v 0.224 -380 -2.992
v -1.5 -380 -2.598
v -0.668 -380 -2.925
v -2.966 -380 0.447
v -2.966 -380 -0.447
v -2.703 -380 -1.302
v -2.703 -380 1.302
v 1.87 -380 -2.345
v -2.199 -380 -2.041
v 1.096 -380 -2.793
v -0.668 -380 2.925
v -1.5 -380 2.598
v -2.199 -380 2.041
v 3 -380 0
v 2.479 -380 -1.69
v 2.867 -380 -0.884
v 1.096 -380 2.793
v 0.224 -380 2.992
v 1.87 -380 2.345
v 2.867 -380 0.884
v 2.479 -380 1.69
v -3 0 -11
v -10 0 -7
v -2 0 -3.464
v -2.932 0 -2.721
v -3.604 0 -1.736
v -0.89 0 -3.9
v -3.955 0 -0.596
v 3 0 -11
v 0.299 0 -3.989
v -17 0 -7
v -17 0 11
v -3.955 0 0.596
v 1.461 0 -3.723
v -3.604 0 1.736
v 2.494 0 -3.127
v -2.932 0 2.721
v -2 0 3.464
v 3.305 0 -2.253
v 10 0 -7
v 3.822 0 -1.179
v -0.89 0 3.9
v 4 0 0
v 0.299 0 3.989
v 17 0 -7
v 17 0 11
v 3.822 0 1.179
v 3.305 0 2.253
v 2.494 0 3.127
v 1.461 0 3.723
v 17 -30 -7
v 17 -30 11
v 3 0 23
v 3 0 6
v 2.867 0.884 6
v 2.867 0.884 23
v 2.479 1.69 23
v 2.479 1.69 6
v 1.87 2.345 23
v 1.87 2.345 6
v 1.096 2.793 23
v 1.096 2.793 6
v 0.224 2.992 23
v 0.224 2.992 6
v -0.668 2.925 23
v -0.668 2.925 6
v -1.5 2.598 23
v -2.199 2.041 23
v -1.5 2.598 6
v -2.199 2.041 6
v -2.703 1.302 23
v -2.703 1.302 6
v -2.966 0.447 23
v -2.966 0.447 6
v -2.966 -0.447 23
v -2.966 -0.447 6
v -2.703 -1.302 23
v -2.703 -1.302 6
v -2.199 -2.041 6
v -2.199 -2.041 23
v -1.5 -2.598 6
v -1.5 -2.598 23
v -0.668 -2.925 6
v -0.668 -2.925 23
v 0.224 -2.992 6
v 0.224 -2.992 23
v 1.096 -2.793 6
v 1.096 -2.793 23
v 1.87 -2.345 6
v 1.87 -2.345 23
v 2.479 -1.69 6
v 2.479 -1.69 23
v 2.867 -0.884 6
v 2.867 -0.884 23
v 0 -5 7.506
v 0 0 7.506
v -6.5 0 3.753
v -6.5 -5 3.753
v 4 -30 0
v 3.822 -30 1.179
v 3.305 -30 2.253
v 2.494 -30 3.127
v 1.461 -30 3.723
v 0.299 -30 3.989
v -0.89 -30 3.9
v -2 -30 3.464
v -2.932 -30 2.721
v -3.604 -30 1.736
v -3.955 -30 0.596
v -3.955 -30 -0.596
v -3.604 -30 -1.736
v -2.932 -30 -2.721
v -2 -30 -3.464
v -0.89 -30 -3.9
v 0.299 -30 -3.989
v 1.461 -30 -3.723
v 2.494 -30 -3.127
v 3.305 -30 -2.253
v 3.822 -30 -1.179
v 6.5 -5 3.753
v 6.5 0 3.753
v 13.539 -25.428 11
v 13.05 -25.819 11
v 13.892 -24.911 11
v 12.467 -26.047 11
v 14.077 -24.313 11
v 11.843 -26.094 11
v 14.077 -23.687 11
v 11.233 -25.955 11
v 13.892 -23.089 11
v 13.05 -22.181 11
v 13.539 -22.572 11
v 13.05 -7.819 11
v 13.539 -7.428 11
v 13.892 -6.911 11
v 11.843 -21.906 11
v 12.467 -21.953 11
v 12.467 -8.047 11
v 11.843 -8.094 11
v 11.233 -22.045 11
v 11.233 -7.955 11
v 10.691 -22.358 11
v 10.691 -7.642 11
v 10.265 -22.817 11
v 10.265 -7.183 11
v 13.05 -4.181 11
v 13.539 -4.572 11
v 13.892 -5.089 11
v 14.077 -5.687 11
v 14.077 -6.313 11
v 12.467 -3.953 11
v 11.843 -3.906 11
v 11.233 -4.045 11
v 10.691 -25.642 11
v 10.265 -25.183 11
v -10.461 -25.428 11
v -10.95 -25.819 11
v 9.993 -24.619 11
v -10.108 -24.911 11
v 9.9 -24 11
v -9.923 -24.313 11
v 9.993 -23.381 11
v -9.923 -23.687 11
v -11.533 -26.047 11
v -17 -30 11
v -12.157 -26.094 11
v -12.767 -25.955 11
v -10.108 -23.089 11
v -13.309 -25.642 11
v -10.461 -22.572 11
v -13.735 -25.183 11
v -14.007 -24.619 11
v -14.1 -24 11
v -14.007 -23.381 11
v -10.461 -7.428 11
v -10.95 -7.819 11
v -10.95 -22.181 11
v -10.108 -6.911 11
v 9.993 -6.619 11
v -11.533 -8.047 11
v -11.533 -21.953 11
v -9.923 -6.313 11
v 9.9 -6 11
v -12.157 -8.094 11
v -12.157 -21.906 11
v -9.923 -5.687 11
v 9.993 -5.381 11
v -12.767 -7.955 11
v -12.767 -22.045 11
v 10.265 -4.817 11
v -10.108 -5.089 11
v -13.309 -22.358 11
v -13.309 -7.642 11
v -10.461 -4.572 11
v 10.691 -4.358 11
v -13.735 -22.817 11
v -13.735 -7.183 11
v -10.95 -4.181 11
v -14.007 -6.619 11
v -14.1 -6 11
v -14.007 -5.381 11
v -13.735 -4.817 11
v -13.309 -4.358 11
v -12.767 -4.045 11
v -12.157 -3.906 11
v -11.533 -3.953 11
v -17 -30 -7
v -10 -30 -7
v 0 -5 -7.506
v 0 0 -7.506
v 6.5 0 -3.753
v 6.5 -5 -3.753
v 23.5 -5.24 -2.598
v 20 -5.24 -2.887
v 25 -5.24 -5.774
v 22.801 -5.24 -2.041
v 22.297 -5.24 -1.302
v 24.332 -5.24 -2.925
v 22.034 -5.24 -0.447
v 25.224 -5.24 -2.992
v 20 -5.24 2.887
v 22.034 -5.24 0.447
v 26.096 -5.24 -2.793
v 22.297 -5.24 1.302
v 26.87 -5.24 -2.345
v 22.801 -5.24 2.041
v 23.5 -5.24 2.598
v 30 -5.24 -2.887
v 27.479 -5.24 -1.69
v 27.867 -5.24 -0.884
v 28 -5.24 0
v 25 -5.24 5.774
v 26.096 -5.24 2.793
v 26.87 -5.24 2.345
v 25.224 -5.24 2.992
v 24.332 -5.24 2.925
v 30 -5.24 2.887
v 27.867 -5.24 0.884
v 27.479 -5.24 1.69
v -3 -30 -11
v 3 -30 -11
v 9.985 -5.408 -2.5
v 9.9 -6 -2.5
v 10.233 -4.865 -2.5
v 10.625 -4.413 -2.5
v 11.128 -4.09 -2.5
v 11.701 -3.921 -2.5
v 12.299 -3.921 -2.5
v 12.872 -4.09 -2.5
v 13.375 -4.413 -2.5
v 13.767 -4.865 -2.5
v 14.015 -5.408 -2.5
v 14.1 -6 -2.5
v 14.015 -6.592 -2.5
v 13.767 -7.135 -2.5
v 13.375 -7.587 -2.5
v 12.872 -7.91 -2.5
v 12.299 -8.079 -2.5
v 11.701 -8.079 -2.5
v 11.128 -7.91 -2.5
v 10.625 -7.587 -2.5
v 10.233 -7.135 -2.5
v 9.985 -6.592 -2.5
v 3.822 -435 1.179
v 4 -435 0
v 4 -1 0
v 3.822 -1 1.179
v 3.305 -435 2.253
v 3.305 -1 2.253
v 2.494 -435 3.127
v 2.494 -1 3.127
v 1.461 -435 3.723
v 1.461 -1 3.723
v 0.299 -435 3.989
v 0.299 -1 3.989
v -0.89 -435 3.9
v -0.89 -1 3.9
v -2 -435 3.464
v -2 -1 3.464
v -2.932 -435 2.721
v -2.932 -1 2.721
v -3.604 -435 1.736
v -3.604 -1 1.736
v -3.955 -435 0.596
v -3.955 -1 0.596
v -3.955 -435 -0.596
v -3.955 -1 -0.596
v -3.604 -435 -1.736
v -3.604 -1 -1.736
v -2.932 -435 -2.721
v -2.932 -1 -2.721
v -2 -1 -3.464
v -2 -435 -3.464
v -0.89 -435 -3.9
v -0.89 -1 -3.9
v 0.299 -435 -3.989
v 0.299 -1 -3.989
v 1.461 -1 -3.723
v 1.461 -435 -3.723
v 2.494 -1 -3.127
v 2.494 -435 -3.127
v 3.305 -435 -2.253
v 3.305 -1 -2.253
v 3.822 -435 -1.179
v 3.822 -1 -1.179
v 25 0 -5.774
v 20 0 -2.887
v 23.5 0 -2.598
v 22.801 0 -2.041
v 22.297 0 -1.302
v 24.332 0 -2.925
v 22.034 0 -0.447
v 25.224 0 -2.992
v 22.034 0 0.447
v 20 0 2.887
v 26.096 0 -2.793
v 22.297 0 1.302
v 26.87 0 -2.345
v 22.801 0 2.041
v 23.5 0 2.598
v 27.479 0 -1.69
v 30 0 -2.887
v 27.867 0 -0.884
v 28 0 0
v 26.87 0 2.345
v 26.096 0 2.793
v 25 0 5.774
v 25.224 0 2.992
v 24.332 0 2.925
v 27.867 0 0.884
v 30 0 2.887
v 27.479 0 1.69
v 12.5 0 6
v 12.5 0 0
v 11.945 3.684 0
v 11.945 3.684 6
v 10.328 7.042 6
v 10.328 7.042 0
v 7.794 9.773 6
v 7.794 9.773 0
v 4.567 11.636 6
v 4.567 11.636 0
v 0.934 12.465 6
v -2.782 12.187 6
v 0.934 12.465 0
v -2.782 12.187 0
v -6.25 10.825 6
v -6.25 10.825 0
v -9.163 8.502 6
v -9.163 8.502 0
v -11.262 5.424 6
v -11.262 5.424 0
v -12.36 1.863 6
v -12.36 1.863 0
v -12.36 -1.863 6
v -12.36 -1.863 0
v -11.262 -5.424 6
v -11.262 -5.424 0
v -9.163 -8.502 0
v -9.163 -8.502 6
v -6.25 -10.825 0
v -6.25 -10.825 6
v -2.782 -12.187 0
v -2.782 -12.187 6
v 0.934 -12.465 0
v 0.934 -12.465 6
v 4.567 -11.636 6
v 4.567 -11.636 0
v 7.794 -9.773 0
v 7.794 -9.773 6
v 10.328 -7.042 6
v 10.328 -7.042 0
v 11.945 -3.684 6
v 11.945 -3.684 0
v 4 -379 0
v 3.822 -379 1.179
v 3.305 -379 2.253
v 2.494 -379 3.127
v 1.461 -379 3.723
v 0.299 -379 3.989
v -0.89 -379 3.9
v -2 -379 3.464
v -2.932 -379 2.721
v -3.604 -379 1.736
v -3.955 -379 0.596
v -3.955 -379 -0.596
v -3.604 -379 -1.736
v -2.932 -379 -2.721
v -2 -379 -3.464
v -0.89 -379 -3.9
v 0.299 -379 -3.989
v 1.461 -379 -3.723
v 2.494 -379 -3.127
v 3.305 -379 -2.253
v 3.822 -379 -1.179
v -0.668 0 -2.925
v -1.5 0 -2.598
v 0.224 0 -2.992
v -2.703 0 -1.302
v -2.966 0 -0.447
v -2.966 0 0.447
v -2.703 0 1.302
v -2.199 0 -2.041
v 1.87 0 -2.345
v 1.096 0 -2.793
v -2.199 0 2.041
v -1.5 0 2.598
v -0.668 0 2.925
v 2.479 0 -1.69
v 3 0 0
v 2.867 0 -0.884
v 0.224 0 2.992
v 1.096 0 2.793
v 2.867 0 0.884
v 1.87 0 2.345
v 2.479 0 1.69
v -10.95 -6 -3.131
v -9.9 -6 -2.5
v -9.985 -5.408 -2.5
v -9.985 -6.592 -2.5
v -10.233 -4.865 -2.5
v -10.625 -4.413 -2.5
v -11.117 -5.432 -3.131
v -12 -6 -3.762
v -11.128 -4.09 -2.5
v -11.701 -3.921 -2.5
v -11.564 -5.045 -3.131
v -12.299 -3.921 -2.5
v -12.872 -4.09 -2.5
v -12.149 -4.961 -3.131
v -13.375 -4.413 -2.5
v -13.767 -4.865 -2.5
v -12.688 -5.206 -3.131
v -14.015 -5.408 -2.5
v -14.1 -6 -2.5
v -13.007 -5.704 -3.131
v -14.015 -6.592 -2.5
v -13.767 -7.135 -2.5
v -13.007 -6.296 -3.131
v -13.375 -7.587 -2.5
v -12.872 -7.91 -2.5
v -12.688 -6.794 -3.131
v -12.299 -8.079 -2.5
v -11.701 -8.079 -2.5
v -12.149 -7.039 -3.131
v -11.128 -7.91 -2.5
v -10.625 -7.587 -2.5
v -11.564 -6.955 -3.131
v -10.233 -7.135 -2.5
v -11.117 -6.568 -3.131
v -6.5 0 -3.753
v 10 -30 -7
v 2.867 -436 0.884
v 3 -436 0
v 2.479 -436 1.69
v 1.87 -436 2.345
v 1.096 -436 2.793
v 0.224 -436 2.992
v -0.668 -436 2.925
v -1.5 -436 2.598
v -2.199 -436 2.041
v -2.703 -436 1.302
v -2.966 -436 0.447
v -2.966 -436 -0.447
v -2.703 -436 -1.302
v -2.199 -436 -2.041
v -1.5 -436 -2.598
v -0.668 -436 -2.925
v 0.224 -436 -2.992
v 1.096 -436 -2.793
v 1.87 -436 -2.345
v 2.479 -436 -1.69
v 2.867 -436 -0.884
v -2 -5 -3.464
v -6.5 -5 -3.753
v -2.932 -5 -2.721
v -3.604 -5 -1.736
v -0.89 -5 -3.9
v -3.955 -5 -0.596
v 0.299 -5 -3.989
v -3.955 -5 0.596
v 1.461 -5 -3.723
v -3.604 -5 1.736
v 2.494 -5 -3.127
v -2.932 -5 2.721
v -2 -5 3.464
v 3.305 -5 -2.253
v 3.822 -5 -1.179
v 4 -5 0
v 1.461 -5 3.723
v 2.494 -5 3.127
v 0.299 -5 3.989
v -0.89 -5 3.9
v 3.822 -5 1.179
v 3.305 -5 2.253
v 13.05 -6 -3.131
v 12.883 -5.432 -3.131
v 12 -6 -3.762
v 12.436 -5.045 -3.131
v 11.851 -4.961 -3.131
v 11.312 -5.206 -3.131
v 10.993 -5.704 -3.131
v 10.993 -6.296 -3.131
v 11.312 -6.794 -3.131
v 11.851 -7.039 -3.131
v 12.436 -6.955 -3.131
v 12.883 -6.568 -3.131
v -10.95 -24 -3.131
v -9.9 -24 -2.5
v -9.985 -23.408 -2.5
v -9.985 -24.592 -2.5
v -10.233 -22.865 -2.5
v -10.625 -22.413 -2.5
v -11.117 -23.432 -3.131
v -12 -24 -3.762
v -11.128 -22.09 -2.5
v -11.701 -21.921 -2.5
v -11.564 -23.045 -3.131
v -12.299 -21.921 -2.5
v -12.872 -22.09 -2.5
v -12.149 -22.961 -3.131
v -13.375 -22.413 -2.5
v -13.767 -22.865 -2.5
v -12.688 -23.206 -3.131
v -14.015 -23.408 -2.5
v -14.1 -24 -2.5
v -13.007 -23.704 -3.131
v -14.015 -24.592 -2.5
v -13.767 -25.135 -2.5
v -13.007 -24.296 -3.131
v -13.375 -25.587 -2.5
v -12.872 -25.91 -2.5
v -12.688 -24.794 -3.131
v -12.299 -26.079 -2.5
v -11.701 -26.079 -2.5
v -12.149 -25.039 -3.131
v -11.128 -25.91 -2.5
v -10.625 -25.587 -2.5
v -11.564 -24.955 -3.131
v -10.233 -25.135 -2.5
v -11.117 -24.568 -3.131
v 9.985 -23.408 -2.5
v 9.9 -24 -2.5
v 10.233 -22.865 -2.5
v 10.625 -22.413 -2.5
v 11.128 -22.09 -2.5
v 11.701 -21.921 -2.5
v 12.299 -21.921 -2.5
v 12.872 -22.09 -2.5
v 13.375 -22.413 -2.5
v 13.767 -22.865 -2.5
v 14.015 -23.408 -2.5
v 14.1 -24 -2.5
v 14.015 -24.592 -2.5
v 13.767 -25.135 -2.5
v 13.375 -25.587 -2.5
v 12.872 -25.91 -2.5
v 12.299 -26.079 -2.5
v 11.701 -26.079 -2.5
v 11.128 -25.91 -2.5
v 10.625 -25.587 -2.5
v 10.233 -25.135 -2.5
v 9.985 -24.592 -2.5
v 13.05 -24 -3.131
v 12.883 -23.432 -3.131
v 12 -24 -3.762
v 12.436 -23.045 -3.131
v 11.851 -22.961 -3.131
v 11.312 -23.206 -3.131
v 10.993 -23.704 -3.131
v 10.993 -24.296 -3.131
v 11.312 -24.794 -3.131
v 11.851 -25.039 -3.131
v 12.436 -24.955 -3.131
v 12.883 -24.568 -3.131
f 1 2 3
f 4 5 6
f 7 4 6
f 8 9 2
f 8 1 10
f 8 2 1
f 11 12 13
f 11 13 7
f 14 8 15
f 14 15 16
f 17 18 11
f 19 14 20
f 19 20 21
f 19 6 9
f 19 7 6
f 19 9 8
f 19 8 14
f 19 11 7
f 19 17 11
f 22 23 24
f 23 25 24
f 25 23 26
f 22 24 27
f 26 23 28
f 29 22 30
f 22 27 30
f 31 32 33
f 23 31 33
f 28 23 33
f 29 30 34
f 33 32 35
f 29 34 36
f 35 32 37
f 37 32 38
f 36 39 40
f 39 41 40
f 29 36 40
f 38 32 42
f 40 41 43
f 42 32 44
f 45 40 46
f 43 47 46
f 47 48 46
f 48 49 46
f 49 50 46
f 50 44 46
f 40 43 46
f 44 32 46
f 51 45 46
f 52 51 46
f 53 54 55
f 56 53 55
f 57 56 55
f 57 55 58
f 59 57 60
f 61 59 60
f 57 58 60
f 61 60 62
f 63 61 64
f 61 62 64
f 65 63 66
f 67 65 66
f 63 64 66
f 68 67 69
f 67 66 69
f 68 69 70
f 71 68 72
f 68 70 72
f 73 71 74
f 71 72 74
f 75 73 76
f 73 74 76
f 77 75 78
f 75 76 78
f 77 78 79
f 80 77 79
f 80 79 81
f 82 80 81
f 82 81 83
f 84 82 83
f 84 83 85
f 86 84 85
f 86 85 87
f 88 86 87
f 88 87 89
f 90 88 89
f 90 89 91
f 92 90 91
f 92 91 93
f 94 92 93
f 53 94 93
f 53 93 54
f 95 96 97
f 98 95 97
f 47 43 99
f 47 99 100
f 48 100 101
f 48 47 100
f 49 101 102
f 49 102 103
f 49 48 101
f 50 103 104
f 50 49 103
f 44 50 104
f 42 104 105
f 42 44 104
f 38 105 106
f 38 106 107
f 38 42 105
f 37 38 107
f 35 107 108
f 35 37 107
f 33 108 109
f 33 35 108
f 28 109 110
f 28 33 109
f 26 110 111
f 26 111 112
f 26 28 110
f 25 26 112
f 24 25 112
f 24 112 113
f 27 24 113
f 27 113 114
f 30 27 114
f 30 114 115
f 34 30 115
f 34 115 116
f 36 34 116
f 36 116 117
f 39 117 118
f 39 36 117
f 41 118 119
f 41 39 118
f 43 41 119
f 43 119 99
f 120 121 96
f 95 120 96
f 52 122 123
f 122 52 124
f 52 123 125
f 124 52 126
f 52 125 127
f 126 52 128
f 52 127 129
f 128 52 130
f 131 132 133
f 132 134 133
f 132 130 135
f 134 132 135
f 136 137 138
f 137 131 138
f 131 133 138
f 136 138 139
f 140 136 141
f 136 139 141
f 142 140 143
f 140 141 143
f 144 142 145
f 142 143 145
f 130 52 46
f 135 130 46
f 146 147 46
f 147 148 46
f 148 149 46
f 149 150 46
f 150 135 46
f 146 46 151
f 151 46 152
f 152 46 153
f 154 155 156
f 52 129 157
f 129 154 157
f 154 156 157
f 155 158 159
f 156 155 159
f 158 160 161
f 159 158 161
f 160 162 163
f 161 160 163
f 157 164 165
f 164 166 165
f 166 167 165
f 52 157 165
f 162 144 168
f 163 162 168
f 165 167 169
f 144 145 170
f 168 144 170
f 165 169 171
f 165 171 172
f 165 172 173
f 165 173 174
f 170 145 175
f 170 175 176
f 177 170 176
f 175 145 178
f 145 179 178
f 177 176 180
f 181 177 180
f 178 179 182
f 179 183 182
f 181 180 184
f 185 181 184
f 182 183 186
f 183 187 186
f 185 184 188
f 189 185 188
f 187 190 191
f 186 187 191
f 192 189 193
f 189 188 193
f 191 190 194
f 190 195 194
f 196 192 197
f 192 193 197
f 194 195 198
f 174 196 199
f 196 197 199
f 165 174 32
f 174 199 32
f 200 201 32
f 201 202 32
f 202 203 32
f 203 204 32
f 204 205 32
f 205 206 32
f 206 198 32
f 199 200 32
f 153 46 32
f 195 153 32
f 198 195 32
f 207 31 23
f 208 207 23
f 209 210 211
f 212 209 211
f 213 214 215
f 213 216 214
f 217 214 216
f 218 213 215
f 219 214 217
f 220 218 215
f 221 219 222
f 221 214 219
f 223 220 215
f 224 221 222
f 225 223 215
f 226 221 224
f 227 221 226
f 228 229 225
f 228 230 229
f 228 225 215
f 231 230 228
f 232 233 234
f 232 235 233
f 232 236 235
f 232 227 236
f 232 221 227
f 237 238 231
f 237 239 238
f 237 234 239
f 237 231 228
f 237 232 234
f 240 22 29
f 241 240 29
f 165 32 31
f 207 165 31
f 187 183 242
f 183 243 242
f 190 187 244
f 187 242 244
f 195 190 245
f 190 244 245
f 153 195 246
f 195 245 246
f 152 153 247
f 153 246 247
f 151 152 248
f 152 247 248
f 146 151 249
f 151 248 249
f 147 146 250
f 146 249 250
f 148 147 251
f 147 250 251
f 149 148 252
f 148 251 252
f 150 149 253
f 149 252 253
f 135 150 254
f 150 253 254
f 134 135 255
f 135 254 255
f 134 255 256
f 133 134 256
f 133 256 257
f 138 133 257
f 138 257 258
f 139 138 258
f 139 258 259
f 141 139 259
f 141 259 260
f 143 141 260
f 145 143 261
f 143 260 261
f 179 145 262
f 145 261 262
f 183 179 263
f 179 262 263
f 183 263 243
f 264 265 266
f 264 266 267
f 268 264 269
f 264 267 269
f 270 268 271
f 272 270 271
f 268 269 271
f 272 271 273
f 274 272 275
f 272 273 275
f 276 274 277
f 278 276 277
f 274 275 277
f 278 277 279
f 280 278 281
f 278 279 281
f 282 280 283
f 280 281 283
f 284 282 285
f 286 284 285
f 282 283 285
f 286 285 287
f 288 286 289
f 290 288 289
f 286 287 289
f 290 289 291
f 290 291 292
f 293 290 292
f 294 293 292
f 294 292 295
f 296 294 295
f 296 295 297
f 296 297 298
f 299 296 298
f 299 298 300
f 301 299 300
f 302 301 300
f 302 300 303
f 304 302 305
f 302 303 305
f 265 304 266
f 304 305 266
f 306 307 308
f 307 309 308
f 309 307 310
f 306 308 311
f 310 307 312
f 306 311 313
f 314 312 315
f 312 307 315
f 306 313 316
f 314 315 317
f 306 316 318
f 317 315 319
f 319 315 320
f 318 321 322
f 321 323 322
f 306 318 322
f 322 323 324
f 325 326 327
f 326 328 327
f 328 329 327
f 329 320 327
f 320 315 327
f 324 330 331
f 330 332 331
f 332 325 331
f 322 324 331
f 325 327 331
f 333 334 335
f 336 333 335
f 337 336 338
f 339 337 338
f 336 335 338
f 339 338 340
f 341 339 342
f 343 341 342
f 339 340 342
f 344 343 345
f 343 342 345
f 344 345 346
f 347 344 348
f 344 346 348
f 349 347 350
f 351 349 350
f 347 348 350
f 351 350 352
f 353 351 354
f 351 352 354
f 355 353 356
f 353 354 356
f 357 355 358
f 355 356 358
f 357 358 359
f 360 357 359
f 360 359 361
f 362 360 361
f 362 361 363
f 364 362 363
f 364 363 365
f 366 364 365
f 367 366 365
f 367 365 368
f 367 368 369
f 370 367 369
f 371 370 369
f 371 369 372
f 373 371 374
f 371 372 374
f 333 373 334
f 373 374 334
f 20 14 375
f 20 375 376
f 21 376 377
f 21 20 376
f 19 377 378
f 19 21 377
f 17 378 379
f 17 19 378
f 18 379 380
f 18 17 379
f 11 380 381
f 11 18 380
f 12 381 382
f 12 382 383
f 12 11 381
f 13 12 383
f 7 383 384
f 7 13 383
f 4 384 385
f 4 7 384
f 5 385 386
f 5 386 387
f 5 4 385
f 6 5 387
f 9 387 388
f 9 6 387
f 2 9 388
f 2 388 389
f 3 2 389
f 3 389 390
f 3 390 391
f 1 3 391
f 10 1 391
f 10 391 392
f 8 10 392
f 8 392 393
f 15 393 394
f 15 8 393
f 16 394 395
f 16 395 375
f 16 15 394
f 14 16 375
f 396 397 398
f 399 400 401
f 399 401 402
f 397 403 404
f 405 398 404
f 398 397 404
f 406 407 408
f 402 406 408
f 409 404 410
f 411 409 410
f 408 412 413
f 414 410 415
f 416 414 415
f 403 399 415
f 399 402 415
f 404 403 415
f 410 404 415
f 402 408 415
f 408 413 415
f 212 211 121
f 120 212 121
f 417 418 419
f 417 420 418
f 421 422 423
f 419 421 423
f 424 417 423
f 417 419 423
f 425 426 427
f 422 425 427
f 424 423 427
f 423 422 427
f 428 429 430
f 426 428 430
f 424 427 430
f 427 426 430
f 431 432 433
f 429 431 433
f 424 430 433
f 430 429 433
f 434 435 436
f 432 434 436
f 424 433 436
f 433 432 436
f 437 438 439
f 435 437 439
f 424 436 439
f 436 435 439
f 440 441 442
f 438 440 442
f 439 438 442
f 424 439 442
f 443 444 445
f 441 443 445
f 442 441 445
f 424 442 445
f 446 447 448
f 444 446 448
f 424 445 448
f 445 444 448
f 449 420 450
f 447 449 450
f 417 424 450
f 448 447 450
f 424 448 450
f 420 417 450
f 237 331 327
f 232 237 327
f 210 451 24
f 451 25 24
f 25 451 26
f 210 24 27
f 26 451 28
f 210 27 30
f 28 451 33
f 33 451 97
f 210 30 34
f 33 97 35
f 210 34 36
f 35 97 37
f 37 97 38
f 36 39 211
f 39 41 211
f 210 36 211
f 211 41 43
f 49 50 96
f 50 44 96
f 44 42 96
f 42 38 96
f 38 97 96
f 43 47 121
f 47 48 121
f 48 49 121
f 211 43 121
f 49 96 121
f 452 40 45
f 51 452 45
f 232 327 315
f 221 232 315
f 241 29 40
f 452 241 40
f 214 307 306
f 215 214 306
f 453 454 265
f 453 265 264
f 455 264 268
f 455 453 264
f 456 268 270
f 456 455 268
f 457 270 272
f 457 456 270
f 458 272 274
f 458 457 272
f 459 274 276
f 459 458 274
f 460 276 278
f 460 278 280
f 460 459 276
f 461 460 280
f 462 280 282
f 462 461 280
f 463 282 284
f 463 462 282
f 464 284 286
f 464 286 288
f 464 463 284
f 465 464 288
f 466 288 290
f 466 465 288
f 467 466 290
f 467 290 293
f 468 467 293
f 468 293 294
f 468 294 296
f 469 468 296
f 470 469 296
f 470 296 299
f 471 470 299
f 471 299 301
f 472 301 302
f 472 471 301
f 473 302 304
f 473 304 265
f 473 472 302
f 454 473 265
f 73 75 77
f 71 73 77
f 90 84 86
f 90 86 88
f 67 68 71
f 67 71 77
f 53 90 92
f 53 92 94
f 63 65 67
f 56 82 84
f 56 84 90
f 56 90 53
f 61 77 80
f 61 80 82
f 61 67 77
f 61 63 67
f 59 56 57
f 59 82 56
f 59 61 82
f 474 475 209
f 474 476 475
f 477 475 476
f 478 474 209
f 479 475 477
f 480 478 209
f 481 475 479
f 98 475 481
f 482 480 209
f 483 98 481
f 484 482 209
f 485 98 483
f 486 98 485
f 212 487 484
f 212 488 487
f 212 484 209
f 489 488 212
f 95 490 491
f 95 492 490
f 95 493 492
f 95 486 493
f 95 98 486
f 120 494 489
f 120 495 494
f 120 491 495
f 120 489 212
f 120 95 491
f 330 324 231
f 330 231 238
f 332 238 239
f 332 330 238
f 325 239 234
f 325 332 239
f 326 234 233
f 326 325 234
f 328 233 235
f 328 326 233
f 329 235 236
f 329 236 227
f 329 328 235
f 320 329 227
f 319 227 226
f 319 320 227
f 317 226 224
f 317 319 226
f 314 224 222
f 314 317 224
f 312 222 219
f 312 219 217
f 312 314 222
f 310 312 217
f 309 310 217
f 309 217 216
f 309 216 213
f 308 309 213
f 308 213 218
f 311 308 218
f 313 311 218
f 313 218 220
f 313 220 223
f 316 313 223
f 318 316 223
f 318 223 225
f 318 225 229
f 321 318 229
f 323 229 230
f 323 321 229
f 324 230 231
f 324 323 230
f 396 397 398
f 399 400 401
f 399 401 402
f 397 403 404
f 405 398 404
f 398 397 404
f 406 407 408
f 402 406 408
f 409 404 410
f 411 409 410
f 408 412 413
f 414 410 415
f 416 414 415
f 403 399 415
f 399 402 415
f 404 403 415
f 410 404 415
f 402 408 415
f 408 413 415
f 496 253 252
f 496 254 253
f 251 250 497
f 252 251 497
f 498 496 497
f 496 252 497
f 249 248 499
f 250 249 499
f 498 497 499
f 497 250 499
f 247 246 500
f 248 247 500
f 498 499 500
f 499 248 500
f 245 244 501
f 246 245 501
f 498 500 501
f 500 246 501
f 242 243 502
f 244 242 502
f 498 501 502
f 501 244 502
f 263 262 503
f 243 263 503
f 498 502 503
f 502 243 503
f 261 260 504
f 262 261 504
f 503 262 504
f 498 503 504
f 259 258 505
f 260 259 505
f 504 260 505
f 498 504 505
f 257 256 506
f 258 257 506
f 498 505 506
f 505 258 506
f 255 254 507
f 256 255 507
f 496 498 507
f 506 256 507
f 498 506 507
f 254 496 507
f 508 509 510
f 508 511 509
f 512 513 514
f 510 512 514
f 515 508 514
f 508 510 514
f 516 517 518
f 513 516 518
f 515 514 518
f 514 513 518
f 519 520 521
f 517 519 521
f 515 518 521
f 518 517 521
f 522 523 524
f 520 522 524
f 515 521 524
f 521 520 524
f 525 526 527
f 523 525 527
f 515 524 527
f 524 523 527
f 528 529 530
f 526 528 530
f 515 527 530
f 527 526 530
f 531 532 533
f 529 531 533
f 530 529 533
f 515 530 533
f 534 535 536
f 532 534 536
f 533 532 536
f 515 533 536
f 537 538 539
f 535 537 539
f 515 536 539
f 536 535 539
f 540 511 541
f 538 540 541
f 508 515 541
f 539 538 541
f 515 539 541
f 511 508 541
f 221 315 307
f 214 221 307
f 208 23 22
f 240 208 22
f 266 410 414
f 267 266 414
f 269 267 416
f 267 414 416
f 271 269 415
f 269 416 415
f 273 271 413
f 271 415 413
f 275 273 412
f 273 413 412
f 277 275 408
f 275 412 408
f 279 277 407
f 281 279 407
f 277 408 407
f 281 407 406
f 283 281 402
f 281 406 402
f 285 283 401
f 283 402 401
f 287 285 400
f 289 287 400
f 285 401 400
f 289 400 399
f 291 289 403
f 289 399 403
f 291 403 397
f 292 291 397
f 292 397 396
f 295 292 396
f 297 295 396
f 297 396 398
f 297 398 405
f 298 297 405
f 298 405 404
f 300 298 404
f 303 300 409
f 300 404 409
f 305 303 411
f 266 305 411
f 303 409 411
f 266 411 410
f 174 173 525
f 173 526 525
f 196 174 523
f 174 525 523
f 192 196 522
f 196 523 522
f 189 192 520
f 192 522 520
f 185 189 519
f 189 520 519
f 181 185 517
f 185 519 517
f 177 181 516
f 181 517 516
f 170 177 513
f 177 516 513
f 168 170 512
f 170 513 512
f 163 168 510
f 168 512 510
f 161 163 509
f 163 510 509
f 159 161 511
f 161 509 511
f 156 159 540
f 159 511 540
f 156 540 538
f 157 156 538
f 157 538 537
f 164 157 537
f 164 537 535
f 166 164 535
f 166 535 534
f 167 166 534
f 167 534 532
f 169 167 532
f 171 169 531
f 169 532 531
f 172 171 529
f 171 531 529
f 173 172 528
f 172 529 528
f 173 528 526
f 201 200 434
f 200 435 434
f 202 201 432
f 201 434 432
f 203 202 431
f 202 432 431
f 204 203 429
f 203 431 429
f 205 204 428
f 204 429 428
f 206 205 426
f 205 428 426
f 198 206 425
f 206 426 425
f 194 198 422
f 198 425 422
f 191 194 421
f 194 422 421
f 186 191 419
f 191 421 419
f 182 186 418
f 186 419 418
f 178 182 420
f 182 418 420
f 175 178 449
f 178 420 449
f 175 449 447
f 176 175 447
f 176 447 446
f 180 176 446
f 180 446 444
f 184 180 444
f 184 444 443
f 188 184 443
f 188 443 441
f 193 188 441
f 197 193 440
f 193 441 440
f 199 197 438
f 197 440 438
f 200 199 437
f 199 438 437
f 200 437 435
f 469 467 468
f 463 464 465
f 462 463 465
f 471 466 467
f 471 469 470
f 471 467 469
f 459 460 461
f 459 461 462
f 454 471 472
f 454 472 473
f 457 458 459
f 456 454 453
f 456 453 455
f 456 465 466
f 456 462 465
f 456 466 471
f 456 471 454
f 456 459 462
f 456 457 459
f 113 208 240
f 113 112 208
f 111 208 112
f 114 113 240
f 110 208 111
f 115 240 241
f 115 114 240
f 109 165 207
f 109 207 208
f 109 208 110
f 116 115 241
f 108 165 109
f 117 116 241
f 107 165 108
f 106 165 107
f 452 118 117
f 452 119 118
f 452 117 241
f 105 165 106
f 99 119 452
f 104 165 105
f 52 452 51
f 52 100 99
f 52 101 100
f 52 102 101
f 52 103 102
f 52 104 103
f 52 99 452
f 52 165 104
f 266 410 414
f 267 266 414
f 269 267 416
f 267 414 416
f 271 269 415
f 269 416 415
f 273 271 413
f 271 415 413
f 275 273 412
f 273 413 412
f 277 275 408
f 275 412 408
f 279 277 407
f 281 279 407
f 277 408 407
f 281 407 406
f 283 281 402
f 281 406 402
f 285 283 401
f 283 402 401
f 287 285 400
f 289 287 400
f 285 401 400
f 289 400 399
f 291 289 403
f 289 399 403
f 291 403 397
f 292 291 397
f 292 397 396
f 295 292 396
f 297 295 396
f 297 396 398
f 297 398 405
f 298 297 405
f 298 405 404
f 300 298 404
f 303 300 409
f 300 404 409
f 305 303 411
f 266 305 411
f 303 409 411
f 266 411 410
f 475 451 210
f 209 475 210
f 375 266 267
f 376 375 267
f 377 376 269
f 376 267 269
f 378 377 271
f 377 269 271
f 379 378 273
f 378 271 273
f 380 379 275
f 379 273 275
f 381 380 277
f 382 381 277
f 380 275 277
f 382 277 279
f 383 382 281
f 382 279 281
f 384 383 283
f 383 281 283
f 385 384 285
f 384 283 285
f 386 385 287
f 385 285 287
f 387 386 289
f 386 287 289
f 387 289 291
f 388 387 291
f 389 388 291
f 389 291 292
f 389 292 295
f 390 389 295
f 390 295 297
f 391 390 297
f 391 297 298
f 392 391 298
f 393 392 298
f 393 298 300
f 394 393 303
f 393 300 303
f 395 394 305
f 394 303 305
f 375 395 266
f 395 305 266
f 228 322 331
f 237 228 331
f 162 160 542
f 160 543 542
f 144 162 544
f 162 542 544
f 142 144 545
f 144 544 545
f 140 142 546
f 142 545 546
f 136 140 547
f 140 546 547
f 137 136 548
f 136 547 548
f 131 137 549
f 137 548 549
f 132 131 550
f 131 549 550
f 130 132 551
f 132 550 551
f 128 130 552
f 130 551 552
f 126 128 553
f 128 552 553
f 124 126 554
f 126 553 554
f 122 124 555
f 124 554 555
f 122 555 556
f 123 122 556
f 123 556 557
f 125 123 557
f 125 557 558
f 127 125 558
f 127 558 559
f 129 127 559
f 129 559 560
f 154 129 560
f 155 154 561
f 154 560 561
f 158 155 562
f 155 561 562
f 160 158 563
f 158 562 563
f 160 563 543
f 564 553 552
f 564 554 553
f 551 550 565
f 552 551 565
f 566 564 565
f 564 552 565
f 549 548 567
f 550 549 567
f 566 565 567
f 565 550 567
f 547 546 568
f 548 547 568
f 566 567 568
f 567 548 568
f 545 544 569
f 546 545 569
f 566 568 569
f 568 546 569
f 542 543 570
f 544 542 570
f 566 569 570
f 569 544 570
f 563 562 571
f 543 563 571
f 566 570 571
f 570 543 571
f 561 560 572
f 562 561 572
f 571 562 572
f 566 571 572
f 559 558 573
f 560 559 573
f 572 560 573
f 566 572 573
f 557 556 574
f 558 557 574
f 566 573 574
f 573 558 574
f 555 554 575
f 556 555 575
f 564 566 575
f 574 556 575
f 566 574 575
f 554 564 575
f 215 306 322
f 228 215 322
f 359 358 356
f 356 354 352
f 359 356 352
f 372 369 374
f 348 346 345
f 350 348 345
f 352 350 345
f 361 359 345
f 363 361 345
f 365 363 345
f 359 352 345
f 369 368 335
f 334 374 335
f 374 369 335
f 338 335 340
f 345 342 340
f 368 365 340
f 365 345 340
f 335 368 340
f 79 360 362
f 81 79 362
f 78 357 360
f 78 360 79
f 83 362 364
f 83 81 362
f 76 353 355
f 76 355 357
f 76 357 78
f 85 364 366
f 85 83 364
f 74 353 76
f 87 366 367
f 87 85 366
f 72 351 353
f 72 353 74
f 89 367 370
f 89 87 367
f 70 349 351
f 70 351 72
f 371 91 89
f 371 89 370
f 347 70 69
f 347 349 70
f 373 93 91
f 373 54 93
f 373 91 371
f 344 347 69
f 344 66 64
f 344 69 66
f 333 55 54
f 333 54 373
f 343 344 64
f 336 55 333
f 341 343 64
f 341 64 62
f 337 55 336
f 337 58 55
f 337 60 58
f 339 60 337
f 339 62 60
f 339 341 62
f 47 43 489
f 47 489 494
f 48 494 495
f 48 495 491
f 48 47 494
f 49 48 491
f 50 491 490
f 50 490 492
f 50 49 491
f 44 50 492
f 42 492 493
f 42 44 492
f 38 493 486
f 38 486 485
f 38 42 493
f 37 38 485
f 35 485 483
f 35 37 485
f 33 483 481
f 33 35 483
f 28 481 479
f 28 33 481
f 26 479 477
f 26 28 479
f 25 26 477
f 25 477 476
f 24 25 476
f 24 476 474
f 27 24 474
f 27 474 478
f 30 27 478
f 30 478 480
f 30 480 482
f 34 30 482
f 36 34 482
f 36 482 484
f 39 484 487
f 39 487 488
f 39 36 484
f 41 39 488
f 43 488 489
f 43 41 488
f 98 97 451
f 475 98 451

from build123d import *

# Parameters (mm, degrees)
F0_R      = 4
F1_DEPTH  = 380
F2_DEPTH  = 436
F3_SIZE   = 1
F3_2_SIZE = 1
F4_R      = 4
F5_DEPTH  = 5
F4_R_2    = 3
F6_DEPTH  = 5.24
F7_R      = 4
F8_DEPTH  = 30
F10_D     = 4.2
F10_DEPTH = 13.5
F10_TIP   = 1.2618073
F11_R     = 12.5
F11_R_2   = 3
F12_DEPTH = 6
F13_DEPTH = 23


with BuildPart() as f1:
    # F0 (on Front) → F1 (new body)
    with BuildSketch(Plane.XZ):
        Circle(F0_R)
    extrude(amount=F1_DEPTH)

    # F3
    f3_edges = [f1.edges().sort_by_distance(p)[0] for p in [
        (-4, -380, 0),
        (-4, 0, 0),
    ]]
    chamfer(f3_edges, length=F3_SIZE)


with BuildPart() as f2:
    # F0 (on Front) → F2 (new body)
    with BuildSketch(Plane.XZ):
        Circle(F0_R)
    extrude(amount=F2_DEPTH)

    # F3#2
    f3_2_edges = [f2.edges().sort_by_distance(p)[0] for p in [
        (-4, 0, 0),
        (-4, -436, 0),
    ]]
    chamfer(f3_2_edges, length=F3_2_SIZE)


with BuildPart() as f5:
    # F4 (on Front) → F5 (new body)
    with BuildSketch(Plane.XZ):
        Polygon((6.5, -3.7527767497), (6.5, 3.7527767497), (0, 7.5055534995), (-6.5, 3.7527767497), (-6.5, -3.7527767497), (0, -7.5055534995), align=None)
        Circle(F4_R, mode=Mode.SUBTRACT)
    extrude(amount=F5_DEPTH)


with BuildPart() as f6:
    # F4 (on Front) → F6 (new body)
    with BuildSketch(Plane.XZ):
        Polygon((30, -2.8867513459), (30, 2.8867513459), (25, 5.7735026919), (20, 2.8867513459), (20, -2.8867513459), (25, -5.7735026919), align=None)
        with Locations((25, 0)):
            Circle(F4_R_2, mode=Mode.SUBTRACT)
    extrude(amount=F6_DEPTH)


with BuildPart() as f8:
    # F7 (on Front) → F8 (new body)
    with BuildSketch(Plane.XZ):
        Polygon((-17, 11), (-17, -7), (-10, -7), (-3, -11), (3, -11), (10, -7), (17, -7), (17, 11), align=None)
        Circle(F7_R, mode=Mode.SUBTRACT)
    extrude(amount=F8_DEPTH)

    # F10
    with Locations(Plane.XY.offset(11)):
        with Locations((12, -24), (12, -6), (-12, -6), (-12, -24)):
            Hole(F10_D / 2, depth=F10_DEPTH)
            with Locations((0, 0, -(F10_DEPTH + F10_TIP / 2))):  # 118° drill point
                Cone(0, F10_D / 2, F10_TIP, mode=Mode.SUBTRACT)


with BuildPart() as f12:
    # F11 (on Top) → F12 (new body)
    with BuildSketch(Plane.XY):
        Circle(F11_R)
        Circle(F11_R_2, mode=Mode.SUBTRACT)
    extrude(amount=F12_DEPTH)

    # F11 (on Top) → F13 (join)
    with BuildSketch(Plane.XY):
        Circle(F11_R_2)
    extrude(amount=F13_DEPTH)


solid = Compound([f1.part, f2.part, f5.part, f6.part, f8.part, f12.part])
